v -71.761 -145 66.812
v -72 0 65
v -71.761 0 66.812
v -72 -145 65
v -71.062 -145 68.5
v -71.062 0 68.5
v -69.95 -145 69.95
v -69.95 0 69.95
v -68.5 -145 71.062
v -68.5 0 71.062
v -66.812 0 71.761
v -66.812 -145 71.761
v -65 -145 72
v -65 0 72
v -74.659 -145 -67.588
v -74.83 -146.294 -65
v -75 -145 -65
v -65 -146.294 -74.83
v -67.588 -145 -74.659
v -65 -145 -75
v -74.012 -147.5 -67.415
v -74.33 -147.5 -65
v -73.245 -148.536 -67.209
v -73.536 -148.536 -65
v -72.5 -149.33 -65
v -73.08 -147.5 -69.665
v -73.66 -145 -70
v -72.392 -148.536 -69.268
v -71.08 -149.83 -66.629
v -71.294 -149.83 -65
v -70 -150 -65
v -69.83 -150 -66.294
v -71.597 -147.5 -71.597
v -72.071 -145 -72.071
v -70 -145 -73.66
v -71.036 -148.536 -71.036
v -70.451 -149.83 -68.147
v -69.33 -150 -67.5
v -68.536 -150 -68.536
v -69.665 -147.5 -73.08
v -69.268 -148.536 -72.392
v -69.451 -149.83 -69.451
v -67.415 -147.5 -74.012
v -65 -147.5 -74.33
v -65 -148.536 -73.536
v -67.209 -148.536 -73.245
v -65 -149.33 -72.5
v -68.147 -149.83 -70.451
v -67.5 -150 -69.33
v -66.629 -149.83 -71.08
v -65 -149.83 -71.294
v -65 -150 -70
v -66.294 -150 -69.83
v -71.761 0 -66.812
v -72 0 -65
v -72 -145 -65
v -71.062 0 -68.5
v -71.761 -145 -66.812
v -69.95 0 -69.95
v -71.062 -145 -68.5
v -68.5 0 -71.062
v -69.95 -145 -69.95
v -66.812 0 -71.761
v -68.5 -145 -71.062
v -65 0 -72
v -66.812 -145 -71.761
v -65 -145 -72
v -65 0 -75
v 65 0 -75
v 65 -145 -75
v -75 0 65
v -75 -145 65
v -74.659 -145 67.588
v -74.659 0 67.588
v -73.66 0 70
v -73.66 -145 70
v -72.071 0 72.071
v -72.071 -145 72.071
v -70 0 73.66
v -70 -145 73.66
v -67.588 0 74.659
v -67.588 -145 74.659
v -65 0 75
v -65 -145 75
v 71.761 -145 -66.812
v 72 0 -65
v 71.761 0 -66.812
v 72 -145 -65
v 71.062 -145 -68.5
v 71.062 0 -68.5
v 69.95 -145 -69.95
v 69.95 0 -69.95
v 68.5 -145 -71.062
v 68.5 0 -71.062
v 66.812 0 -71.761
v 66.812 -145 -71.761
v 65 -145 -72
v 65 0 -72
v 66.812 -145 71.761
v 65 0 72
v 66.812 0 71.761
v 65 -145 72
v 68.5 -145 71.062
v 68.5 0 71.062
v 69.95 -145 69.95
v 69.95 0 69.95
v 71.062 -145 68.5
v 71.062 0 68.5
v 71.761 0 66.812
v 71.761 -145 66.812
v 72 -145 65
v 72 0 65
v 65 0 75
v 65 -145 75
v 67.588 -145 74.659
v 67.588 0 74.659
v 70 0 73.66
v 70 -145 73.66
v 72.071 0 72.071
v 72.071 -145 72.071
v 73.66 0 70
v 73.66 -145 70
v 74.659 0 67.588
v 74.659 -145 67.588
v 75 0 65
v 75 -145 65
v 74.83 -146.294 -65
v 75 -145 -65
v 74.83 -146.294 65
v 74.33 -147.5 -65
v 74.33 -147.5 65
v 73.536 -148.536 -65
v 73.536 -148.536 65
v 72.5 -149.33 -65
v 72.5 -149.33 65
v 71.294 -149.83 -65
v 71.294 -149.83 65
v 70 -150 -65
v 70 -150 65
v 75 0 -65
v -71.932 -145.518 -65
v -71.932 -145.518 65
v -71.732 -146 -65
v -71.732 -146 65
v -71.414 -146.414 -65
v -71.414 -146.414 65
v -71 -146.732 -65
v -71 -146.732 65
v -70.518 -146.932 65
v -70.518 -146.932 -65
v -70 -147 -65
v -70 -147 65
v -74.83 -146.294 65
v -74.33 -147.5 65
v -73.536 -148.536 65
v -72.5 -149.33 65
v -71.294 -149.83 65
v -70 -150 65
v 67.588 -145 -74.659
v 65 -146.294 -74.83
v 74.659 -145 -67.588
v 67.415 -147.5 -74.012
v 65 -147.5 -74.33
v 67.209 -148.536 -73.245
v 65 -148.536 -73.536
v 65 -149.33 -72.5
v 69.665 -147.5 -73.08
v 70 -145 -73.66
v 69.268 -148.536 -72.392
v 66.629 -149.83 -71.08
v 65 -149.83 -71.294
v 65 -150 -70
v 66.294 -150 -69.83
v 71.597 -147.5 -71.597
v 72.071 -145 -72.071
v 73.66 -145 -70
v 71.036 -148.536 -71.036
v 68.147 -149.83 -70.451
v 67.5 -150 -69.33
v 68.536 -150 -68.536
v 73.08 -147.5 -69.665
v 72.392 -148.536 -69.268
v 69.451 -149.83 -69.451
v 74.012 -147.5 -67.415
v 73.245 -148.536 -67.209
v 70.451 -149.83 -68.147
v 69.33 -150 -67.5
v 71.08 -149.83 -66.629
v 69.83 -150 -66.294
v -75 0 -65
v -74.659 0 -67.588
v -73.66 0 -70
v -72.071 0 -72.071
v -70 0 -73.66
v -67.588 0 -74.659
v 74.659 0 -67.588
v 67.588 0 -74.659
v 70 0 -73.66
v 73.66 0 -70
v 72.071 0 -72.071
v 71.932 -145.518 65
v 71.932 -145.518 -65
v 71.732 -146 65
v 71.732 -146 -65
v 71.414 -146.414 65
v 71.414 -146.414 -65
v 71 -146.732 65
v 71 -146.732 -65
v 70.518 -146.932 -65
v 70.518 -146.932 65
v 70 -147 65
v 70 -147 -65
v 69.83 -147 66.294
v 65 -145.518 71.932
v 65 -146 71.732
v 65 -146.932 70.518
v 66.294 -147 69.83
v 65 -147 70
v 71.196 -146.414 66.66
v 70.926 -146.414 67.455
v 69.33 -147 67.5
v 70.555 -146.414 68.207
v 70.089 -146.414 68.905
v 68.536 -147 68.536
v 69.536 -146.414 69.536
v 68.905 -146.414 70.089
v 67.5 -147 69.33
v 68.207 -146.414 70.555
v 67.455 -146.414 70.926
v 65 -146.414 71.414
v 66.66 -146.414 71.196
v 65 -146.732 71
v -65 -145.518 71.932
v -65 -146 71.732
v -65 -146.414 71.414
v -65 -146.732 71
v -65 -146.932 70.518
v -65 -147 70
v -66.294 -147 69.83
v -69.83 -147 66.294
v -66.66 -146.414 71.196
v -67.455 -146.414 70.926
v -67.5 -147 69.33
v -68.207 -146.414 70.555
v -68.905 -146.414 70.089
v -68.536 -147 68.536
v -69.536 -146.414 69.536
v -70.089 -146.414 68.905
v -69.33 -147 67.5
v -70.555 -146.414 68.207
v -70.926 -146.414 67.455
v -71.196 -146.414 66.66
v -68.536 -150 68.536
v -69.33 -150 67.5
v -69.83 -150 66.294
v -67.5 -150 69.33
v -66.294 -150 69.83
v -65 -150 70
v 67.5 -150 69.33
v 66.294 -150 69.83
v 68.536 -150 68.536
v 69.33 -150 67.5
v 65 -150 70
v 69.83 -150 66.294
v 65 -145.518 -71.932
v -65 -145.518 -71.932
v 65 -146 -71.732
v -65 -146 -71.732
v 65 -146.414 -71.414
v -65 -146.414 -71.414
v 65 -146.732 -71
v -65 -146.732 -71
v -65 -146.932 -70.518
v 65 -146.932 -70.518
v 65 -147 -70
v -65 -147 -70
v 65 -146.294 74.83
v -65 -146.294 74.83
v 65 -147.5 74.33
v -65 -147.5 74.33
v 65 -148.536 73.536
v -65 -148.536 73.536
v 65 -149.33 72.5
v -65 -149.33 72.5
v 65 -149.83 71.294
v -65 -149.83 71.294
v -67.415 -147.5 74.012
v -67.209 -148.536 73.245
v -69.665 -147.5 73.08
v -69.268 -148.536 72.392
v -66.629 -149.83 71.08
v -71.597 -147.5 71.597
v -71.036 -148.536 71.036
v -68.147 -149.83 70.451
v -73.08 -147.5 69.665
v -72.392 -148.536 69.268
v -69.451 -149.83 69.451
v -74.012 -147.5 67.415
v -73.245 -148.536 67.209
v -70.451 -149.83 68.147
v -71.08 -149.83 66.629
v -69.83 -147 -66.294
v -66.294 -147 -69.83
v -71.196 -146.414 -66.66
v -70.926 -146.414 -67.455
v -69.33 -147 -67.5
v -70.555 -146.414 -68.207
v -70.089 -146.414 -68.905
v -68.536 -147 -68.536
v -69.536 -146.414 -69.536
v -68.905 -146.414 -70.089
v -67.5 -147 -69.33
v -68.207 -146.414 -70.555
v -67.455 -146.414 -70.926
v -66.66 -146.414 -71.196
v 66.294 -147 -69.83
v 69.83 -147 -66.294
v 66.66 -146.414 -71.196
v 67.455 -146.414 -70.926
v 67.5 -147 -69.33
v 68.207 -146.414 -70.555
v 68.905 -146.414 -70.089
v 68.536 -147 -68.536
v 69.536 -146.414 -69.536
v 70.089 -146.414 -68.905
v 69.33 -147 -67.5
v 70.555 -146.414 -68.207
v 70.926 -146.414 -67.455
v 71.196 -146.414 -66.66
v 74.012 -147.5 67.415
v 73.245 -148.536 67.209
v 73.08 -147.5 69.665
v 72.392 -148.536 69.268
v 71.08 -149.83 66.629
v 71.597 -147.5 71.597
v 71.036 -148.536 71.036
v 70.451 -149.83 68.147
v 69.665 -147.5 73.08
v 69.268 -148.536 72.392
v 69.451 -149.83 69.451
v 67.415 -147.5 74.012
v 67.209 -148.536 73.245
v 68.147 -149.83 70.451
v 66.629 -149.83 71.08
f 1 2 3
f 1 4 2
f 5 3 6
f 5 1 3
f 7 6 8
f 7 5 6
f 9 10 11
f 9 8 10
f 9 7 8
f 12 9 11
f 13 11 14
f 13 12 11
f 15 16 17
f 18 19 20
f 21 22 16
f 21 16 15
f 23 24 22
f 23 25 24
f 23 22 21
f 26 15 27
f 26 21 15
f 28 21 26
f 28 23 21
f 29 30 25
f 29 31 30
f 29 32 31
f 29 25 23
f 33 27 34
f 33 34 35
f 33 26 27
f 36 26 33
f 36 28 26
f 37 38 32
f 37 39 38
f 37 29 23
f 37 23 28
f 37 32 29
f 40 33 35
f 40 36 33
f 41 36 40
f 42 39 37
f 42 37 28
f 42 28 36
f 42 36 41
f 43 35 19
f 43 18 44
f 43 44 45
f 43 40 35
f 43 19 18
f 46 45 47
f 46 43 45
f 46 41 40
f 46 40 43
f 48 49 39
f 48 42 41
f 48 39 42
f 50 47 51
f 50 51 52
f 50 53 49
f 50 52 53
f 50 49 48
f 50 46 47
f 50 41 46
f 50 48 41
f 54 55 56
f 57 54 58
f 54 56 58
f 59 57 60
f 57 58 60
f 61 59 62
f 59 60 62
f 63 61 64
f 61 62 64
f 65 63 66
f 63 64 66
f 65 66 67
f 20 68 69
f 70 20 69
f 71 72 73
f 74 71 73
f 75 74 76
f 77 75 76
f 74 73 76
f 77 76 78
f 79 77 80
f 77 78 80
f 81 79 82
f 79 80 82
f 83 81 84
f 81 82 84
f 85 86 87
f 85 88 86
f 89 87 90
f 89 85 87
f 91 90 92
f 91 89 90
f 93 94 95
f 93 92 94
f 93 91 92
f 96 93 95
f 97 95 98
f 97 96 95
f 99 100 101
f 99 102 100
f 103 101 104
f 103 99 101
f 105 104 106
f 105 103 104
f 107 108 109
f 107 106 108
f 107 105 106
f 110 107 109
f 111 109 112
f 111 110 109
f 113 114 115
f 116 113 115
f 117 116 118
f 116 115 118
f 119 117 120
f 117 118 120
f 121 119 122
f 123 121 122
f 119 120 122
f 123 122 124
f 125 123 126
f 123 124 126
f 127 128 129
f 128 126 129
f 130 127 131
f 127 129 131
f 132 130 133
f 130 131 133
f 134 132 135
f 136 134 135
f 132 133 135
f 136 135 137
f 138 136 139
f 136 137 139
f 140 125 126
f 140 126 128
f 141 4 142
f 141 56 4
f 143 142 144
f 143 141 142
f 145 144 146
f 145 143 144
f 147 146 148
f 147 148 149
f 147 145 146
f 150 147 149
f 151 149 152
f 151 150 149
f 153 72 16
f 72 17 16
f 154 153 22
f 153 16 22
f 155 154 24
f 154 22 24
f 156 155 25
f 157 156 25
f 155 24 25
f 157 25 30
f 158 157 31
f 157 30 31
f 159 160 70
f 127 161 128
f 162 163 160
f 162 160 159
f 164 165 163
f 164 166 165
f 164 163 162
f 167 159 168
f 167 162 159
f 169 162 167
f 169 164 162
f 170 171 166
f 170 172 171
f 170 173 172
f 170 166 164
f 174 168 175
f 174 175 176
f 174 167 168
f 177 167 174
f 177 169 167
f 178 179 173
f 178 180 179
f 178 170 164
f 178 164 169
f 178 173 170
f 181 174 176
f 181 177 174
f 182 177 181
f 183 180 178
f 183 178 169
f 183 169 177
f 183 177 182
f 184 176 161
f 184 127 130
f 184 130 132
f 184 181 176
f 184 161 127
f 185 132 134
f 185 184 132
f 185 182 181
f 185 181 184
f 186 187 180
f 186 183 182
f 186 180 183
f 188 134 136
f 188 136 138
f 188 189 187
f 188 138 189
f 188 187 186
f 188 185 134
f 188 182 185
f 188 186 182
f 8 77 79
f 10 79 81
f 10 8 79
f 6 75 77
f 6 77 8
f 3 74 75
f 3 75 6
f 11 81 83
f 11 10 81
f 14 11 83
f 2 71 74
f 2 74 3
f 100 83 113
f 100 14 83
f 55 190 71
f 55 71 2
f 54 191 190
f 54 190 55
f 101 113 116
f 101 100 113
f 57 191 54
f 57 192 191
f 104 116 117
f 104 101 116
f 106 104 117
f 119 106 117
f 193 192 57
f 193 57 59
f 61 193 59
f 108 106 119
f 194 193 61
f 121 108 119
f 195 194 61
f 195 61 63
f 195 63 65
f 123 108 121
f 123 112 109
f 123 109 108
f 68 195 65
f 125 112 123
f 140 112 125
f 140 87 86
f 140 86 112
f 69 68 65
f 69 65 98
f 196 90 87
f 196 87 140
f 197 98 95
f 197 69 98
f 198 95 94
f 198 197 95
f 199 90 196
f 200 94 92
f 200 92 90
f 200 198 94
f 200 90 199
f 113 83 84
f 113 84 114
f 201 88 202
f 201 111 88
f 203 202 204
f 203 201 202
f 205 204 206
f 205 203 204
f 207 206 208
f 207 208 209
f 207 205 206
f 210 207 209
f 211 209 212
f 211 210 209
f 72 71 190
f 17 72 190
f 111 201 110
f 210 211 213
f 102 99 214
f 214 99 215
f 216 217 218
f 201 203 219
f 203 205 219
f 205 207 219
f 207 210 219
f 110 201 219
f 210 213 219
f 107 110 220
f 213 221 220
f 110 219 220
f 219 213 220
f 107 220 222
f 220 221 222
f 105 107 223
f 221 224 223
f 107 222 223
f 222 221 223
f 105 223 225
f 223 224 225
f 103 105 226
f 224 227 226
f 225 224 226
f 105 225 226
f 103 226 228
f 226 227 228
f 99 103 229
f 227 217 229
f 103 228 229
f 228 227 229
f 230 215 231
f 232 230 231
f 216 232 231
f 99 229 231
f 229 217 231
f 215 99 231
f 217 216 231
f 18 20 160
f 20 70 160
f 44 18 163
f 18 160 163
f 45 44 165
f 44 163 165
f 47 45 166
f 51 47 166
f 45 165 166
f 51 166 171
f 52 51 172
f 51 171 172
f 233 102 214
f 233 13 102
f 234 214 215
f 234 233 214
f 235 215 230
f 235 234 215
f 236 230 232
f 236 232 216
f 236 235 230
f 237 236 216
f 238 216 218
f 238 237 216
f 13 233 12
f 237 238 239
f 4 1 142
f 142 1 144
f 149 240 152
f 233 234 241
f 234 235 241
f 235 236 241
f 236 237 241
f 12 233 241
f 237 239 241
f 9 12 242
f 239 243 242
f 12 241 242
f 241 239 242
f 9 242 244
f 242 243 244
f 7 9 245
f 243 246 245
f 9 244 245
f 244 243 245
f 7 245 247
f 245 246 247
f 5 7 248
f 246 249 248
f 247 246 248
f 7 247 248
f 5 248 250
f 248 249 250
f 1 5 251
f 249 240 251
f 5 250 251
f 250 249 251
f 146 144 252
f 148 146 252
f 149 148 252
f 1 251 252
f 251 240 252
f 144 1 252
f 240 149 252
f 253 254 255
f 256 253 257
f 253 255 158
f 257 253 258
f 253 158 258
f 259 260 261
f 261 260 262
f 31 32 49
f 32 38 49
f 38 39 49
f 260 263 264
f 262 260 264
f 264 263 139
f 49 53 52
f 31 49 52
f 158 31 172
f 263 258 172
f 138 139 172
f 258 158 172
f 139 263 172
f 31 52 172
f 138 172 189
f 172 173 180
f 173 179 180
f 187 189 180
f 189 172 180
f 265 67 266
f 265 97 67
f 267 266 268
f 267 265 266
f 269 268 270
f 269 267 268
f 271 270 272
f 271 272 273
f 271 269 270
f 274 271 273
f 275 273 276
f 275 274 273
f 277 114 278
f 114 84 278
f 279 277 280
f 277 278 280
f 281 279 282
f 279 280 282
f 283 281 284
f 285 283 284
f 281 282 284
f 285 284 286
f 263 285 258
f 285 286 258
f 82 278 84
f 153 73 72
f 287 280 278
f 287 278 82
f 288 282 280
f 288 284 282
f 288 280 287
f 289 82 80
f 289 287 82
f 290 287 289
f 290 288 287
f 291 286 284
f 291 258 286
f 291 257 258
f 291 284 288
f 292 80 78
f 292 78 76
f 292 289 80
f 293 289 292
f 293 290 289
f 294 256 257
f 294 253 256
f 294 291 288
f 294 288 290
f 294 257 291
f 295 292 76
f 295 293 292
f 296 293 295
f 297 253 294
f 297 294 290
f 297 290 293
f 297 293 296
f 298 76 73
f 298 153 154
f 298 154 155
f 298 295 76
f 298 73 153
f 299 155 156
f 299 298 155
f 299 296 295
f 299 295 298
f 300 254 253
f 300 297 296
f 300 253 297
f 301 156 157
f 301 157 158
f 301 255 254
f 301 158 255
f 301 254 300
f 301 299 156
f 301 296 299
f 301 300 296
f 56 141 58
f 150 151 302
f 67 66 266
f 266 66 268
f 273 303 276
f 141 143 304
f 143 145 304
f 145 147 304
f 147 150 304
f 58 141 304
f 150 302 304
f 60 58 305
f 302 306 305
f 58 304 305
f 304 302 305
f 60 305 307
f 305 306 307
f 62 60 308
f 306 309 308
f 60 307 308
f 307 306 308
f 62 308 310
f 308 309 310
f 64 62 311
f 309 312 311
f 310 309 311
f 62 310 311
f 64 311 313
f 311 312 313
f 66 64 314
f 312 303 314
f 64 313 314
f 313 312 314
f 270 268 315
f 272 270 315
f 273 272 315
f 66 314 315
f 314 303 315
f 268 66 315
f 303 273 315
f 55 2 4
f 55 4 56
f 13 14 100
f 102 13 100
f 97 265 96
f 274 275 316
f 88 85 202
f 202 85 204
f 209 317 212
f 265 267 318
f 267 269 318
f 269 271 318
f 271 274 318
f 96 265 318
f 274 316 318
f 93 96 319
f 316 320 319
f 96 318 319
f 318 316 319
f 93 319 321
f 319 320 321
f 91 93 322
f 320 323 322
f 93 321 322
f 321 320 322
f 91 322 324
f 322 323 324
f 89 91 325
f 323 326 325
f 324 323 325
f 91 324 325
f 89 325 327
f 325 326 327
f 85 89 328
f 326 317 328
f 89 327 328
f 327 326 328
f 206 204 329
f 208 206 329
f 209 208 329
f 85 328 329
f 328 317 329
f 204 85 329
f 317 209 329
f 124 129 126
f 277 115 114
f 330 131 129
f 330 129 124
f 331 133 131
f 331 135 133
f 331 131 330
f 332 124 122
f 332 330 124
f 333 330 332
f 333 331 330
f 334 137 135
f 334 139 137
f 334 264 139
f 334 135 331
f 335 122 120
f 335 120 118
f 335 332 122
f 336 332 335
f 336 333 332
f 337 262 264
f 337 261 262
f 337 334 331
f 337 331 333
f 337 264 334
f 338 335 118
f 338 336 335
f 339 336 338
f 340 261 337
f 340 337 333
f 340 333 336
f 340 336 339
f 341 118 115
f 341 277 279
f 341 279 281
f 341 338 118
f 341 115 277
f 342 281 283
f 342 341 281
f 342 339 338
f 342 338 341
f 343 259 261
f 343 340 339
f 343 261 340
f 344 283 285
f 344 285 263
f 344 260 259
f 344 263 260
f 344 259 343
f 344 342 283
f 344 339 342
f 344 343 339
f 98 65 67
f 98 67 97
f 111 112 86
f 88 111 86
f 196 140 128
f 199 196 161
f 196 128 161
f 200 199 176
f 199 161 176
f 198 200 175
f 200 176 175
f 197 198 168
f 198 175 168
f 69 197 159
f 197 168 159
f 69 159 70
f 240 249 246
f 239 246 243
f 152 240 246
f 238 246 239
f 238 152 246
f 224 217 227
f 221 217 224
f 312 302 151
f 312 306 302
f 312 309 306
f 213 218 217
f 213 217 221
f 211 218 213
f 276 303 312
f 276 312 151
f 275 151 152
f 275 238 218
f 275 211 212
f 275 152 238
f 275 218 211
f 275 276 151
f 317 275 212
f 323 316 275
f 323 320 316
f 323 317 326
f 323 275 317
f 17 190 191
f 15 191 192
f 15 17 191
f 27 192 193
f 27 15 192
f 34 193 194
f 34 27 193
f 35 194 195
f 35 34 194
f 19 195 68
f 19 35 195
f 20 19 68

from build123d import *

# Parameters (mm, degrees)
CROQUIS1_W     = 150
CROQUIS1_H     = 150
EXTRUIR1_DEPTH = 150
REDONDEO1_R    = 10
REDONDEO2_R    = 5
VACIADO1_T     = -3


with BuildPart() as part:
    # Croquis1 → Extruir1 (new body)
    with BuildSketch(Plane(origin=(0, 0, 0), x_dir=(1, 0, 0), z_dir=(0, 1, 0))):
        Rectangle(CROQUIS1_W, CROQUIS1_H)
    extrude(amount=-EXTRUIR1_DEPTH)

    # Redondeo1
    redondeo1_edges = [part.edges().sort_by_distance(p)[0] for p in [
        (-75, -75, -75),
        (75, -75, -75),
        (75, -75, 75),
        (-75, -75, 75),
    ]]
    fillet(redondeo1_edges, radius=REDONDEO1_R)

    # Redondeo2
    redondeo2_edges = [part.edges().sort_by_distance(p)[0] for p in [
        (-75, -150, 0),
        (0, -150, 75),
        (0, -150, -75),
        (75, -150, 0),
        (72.071067812, -150, -72.071067812),
        (72.071067812, -150, 72.071067812),
        (-72.071067812, -150, -72.071067812),
        (-72.071067812, -150, 72.071067812),
    ]]
    fillet(redondeo2_edges, radius=REDONDEO2_R)

    # Vaciado1
    vaciado1_openings = [part.faces().sort_by_distance(p)[0] for p in [
        (0, 0, 0),
    ]]
    offset(amount=VACIADO1_T, openings=vaciado1_openings, kind=Kind.INTERSECTION)


solid = part.part
